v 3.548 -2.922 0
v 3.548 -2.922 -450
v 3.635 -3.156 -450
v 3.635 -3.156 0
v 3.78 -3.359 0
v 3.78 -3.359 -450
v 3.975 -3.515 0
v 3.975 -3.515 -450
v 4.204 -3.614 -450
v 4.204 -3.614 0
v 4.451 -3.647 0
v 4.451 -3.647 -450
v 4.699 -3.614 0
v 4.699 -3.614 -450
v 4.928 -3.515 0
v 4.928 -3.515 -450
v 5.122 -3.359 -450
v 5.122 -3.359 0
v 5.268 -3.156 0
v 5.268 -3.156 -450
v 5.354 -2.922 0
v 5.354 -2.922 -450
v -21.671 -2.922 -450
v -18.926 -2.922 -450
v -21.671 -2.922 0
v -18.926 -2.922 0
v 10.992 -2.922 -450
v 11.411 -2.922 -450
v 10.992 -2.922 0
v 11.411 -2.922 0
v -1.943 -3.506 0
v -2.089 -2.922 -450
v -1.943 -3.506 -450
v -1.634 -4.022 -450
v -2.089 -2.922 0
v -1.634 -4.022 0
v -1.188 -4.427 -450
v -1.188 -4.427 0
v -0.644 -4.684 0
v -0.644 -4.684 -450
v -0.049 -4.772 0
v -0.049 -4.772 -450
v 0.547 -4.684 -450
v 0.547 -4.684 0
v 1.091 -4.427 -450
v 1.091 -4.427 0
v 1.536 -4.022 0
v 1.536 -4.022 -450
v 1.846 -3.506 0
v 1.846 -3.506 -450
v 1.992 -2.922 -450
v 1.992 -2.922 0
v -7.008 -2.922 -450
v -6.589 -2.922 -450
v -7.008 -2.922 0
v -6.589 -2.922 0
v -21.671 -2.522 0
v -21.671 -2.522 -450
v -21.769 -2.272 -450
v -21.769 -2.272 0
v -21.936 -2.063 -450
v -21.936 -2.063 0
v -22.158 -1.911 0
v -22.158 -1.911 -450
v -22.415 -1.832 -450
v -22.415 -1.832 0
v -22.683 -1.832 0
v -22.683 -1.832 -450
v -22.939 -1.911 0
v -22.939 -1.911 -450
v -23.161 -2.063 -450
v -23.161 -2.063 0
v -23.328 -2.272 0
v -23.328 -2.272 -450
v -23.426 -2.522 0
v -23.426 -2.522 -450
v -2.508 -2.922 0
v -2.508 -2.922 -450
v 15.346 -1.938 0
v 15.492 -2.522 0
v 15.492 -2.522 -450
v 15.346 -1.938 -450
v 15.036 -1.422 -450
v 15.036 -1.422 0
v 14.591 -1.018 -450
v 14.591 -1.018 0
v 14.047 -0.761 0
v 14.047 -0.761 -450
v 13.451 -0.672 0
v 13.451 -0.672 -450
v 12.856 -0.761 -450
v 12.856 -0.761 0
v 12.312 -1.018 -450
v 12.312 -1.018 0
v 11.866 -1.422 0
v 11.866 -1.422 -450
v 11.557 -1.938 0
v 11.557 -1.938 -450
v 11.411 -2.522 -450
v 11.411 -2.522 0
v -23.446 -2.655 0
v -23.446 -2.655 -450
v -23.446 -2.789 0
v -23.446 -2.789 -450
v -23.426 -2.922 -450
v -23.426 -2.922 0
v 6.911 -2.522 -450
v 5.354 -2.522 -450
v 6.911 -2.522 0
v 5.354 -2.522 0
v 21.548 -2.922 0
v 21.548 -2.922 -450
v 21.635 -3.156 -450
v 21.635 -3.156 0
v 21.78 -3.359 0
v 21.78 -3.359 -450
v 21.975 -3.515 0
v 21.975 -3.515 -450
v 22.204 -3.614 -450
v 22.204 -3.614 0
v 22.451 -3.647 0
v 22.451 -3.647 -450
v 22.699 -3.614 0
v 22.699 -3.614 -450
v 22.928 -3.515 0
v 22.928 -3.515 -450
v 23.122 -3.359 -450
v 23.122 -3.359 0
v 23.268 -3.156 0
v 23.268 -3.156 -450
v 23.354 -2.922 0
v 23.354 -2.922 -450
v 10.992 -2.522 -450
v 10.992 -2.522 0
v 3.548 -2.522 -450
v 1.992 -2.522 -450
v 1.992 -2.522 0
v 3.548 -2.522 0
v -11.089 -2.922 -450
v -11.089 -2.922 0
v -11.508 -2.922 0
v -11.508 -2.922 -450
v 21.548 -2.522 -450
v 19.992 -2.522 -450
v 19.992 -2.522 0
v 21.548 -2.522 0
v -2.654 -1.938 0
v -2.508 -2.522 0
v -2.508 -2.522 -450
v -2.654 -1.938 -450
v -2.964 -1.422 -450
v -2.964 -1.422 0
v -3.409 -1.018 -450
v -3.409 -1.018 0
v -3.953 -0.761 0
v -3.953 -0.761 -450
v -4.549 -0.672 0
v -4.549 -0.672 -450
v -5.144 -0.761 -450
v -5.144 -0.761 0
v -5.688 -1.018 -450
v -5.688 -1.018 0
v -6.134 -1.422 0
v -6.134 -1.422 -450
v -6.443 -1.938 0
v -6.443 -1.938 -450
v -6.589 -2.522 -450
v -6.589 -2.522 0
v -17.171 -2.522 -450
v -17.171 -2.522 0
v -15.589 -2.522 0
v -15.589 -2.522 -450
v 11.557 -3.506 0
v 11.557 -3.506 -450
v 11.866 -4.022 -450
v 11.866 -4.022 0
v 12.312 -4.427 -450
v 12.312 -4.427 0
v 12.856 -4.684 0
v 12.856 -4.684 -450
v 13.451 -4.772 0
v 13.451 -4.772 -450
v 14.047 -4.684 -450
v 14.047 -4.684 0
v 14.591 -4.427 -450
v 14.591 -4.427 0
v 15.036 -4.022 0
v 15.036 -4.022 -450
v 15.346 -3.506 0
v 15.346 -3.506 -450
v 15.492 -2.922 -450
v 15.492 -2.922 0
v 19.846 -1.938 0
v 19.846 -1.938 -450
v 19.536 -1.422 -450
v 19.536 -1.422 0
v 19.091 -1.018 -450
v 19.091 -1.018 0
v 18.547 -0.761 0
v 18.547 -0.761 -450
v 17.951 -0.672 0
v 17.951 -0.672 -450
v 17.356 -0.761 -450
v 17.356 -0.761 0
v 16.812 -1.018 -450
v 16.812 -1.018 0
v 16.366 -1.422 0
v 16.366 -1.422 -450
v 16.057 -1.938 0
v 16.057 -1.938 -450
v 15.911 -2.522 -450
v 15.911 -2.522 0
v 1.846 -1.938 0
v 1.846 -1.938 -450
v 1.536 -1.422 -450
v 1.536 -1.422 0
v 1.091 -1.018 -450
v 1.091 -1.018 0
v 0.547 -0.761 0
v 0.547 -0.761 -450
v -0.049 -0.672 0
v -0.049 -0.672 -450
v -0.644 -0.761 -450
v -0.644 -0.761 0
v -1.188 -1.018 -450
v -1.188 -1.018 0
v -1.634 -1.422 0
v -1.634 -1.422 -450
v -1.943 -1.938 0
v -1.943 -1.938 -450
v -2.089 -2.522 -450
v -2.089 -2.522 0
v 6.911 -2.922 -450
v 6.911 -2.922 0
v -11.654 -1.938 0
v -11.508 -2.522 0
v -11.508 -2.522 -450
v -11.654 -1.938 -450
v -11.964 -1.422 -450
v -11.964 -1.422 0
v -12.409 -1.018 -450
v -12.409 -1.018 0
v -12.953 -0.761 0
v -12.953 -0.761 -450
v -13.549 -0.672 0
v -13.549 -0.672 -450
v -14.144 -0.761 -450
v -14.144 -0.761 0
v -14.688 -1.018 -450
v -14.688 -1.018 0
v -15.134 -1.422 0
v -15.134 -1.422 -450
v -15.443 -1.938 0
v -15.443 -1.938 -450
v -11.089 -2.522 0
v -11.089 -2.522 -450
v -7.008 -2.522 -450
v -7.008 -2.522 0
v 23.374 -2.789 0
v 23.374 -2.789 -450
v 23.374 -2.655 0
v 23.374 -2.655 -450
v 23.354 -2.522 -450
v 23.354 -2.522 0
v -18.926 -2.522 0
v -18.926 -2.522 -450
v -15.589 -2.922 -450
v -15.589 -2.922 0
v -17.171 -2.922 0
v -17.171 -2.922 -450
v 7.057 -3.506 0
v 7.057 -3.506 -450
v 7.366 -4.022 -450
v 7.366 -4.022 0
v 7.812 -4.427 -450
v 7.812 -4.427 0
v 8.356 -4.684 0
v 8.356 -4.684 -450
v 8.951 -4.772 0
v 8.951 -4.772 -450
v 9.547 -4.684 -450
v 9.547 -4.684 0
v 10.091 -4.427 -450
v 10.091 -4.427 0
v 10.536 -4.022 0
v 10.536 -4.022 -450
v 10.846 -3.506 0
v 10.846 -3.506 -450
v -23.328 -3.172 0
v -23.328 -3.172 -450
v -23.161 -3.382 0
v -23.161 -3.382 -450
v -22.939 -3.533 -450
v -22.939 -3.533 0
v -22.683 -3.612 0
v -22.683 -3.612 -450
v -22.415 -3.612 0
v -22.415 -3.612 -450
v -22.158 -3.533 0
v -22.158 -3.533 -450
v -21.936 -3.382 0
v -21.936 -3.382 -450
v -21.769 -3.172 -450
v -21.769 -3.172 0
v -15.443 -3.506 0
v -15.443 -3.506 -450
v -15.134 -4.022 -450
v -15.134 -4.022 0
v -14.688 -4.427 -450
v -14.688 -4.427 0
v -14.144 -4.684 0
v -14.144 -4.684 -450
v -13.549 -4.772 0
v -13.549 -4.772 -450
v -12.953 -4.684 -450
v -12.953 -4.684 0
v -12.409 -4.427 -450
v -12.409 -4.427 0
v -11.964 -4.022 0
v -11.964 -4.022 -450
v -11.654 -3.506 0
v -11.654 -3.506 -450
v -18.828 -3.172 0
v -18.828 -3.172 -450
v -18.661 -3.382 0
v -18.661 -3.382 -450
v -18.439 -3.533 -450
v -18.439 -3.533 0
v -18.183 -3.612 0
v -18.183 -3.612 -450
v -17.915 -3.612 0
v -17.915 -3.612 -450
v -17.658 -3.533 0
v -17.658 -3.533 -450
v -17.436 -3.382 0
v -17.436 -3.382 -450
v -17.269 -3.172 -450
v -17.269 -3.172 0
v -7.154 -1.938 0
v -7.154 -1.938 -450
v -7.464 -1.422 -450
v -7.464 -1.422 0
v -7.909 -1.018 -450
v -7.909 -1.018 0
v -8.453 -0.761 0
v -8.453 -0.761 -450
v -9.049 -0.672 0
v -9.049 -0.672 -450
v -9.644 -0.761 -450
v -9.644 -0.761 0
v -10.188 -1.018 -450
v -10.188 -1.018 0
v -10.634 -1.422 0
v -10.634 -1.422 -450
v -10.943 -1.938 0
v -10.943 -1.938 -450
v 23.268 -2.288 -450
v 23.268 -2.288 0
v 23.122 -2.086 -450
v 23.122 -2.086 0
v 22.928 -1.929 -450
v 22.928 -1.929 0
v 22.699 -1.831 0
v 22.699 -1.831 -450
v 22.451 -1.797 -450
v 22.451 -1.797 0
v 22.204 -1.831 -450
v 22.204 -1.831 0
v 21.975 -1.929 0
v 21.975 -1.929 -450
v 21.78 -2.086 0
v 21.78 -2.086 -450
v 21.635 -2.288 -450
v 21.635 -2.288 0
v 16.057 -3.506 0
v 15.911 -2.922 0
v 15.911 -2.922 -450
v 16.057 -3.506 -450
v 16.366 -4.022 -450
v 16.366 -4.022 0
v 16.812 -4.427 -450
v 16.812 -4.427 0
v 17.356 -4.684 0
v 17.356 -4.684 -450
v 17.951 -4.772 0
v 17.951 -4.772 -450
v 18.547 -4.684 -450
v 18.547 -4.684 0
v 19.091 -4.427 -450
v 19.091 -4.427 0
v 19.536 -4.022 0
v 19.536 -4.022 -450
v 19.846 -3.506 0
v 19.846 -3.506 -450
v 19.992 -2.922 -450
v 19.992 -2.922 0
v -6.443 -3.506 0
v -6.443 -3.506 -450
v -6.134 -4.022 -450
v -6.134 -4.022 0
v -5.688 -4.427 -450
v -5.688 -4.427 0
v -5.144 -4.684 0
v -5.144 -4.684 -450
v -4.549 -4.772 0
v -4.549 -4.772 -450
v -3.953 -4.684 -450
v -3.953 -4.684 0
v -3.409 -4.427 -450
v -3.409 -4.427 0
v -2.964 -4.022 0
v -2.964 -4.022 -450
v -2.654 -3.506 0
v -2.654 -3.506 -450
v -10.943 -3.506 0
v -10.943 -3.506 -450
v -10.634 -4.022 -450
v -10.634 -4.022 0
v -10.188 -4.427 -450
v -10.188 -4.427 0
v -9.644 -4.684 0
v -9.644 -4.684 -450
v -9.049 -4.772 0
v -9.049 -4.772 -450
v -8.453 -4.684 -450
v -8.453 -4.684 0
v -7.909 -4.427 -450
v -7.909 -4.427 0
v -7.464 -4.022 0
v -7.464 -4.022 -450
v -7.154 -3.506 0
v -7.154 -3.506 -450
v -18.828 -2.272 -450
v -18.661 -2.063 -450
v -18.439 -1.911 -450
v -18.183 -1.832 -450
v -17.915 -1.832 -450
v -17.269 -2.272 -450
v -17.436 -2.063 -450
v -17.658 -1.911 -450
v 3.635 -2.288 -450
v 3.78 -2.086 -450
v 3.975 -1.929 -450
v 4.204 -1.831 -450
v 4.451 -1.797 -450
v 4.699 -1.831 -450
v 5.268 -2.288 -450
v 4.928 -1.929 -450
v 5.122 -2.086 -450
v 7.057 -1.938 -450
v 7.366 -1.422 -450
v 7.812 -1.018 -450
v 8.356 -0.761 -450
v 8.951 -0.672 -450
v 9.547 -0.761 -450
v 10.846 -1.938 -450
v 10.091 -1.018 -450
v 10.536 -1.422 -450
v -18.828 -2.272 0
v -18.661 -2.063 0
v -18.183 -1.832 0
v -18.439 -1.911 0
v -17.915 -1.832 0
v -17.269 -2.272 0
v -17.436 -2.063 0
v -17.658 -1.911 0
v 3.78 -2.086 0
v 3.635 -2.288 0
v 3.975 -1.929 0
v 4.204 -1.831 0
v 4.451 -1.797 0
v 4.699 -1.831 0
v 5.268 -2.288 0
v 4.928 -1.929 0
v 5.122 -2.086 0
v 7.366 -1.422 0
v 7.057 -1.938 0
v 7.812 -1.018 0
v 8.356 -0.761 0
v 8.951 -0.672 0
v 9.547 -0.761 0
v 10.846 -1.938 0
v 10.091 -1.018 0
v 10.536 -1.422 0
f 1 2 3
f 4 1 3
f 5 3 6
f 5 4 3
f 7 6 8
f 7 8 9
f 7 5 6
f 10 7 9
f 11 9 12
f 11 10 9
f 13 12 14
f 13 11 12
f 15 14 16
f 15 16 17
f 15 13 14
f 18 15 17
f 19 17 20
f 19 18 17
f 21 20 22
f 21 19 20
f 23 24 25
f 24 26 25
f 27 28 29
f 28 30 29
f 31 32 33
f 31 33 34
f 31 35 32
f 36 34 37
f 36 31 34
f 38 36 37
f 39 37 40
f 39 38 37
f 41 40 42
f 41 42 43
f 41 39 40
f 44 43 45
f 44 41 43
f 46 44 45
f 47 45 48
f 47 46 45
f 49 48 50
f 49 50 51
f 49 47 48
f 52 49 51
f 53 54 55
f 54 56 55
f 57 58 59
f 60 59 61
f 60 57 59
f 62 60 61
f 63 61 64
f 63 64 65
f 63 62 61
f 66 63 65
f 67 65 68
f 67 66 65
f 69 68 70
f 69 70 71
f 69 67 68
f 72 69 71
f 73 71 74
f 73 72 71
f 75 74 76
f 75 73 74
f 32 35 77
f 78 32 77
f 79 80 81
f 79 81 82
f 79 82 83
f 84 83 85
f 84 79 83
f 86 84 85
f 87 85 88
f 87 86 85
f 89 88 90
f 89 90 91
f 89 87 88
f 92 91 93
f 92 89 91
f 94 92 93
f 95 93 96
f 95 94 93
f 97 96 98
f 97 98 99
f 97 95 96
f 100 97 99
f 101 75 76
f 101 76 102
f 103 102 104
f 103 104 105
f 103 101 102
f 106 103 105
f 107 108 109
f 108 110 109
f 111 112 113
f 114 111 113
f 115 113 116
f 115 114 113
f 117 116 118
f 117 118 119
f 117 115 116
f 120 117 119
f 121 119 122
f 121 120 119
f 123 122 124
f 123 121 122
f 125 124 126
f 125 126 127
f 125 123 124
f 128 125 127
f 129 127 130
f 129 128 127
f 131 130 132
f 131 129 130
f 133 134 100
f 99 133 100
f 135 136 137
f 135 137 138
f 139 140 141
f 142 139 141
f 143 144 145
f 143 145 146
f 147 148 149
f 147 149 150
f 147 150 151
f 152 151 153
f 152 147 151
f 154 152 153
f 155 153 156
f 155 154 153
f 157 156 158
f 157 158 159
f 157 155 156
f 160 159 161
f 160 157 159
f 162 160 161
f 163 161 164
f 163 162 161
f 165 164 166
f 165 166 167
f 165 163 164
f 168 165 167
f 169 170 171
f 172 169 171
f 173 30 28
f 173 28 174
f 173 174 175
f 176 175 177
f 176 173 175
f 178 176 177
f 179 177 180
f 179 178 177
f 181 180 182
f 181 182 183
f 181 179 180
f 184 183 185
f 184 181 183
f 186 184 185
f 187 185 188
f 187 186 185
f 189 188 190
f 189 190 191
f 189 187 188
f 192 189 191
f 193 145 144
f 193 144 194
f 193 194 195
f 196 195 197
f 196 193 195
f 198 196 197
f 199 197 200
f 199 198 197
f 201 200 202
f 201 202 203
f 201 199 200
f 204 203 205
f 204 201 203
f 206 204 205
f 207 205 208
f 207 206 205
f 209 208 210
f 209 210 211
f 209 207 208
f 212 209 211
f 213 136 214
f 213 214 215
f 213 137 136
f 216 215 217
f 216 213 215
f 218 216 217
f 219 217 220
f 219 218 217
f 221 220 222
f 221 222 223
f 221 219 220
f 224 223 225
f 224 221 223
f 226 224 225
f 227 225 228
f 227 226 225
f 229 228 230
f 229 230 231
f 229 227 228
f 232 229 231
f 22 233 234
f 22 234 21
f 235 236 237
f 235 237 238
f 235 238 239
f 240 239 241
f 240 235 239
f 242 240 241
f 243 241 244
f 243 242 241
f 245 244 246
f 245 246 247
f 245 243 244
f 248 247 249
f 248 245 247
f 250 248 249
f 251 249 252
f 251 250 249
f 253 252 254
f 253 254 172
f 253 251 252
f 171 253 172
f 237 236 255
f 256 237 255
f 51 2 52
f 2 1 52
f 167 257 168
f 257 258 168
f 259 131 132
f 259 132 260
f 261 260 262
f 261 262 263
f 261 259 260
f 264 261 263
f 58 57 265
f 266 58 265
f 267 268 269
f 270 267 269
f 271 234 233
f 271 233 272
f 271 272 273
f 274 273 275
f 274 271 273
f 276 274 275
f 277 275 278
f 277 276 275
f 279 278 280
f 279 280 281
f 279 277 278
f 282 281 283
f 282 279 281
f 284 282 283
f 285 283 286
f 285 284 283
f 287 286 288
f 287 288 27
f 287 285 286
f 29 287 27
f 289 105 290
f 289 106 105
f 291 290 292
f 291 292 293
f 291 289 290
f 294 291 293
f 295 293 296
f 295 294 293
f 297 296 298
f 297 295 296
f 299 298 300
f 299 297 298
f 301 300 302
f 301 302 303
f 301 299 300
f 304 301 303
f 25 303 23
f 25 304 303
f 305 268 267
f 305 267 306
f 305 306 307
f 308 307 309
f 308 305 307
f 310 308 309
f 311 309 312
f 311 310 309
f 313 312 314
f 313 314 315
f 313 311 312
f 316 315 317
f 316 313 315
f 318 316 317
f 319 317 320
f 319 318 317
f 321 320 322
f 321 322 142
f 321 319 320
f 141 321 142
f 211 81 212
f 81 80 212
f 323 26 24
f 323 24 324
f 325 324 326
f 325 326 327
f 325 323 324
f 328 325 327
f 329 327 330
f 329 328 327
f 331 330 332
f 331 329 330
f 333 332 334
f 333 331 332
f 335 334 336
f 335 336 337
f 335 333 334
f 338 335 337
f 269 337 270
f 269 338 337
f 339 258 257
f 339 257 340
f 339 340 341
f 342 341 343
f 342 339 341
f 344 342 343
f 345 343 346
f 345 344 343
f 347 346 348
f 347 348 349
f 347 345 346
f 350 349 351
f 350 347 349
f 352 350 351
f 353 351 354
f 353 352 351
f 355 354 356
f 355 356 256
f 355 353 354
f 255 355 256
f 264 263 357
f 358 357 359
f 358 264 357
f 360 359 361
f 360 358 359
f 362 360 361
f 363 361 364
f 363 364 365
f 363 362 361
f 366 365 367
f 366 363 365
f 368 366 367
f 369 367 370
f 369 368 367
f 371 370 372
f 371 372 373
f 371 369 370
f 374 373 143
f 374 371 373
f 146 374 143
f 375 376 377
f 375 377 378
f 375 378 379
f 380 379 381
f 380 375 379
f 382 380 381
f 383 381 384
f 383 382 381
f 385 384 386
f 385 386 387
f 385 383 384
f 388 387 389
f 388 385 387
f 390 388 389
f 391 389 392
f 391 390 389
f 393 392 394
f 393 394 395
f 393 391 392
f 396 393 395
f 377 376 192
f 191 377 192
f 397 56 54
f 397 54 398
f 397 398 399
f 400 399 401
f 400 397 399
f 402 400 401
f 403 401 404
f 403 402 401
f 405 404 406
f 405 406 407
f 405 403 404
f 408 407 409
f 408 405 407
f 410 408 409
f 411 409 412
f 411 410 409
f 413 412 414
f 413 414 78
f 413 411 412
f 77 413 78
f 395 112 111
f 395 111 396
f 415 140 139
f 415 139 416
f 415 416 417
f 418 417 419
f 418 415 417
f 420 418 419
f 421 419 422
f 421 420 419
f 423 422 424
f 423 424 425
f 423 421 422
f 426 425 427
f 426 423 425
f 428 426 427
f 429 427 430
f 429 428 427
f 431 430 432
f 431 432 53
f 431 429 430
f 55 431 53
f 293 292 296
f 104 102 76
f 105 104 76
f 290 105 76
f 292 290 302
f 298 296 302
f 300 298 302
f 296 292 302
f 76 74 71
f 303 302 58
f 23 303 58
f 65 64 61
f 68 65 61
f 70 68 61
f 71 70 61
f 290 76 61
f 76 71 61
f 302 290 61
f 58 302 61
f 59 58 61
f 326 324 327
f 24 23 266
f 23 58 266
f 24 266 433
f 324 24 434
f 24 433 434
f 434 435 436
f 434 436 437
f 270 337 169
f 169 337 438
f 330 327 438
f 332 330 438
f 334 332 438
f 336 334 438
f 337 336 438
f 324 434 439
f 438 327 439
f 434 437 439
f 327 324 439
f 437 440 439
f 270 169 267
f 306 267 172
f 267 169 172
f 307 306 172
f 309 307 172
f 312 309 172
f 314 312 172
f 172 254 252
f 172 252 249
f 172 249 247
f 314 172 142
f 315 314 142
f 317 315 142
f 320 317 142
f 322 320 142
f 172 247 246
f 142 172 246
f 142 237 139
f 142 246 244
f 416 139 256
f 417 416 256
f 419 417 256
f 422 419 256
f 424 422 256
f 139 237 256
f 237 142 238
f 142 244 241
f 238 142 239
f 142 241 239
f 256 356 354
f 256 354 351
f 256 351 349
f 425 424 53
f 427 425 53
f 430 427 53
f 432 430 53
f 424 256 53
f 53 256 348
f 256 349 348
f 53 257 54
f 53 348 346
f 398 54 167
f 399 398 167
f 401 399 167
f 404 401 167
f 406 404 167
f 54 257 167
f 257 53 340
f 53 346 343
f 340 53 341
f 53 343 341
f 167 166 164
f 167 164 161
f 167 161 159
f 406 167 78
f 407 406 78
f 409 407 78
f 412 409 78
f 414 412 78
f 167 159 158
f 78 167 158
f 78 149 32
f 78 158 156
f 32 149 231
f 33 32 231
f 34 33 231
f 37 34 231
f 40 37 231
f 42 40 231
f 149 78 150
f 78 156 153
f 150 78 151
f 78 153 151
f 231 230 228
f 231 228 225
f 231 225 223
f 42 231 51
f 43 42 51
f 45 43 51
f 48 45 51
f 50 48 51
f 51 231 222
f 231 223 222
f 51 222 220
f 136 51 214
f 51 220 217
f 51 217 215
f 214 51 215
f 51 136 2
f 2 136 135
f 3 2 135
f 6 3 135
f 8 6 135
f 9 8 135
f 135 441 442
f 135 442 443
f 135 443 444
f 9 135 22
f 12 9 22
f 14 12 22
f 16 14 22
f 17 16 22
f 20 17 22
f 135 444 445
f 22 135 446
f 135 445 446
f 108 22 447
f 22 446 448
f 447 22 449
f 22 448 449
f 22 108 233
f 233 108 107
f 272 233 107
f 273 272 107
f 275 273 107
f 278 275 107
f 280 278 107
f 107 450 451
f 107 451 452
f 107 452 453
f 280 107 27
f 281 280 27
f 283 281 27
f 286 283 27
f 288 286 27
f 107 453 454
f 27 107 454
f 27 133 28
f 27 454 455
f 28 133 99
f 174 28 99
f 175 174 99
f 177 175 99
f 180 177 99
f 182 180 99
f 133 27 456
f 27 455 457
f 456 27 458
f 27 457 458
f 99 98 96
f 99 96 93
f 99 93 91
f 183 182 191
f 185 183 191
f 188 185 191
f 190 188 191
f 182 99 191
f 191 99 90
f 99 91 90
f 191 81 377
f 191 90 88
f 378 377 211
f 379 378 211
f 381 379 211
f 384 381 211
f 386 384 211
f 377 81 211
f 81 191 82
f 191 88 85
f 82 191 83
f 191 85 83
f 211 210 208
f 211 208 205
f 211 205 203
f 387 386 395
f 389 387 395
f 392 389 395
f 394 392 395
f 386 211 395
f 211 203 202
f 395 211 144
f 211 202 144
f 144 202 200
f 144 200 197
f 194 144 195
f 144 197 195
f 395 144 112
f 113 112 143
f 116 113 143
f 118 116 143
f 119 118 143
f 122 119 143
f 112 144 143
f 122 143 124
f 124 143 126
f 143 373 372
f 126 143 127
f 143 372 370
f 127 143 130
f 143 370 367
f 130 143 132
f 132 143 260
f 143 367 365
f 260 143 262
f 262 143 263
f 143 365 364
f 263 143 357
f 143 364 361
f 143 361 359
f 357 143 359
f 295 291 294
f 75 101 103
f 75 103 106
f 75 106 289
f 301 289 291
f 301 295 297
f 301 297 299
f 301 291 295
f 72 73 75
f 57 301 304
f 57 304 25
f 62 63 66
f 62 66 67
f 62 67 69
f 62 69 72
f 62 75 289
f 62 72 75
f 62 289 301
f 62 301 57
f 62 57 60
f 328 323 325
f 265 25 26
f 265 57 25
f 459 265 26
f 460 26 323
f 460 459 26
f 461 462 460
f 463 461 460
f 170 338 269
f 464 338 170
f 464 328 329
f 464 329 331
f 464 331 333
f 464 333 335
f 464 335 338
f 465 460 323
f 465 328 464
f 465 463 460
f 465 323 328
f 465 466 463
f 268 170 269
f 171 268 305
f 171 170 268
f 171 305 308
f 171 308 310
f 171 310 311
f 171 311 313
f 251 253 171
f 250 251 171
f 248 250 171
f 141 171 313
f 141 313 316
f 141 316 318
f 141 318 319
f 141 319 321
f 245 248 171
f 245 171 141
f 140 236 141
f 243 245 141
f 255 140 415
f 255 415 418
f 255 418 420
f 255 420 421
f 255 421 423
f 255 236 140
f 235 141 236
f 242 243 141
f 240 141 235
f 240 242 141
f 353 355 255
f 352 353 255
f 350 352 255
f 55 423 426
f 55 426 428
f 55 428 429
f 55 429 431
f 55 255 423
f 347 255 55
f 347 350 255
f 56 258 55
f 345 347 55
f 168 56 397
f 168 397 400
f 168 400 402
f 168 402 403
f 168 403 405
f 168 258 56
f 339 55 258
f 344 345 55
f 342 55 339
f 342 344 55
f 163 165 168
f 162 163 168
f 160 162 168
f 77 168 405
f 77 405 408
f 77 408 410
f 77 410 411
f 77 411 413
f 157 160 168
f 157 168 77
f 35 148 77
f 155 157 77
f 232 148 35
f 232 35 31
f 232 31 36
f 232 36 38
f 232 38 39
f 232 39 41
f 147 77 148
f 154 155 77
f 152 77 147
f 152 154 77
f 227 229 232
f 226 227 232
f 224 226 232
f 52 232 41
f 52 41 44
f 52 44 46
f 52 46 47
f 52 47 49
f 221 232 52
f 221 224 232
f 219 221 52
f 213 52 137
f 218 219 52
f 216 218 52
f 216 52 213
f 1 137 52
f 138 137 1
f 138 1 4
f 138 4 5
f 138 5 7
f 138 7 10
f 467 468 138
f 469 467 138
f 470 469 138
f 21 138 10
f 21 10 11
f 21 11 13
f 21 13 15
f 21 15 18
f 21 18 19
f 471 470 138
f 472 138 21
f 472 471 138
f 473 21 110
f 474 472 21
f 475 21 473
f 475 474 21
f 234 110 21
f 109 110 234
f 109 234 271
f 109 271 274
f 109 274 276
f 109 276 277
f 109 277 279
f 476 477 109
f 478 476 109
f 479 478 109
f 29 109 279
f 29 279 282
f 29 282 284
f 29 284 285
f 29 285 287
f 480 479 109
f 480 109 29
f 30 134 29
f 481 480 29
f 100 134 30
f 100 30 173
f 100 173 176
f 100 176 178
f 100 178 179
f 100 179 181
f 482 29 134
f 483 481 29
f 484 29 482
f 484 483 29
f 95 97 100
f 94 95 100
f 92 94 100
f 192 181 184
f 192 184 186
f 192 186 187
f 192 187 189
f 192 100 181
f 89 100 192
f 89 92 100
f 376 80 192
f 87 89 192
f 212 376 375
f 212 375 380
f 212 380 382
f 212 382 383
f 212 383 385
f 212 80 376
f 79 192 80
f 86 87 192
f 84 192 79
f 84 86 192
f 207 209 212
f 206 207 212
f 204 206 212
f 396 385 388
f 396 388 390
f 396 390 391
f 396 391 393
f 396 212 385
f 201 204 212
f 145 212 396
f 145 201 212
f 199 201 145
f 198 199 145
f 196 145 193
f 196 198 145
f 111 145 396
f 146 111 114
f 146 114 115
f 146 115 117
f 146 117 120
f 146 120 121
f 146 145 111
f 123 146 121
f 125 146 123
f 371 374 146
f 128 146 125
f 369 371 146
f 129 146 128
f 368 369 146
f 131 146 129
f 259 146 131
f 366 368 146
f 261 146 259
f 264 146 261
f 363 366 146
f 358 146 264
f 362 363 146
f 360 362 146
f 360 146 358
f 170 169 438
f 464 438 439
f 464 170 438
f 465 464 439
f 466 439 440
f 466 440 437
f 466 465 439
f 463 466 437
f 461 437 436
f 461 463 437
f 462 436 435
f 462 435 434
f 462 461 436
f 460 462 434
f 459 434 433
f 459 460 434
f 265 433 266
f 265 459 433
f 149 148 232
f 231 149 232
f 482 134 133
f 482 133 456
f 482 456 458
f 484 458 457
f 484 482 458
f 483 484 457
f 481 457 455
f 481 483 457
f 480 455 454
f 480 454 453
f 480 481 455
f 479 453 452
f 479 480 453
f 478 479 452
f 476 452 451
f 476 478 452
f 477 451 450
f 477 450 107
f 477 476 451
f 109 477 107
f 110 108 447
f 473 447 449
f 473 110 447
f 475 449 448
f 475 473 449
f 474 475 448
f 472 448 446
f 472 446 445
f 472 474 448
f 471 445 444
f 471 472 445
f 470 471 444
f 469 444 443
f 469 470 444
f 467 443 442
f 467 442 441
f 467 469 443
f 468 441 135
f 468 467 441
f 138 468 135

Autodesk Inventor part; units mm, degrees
ref_plane "YZ Plane" through (0, 0, 0) normal (1, 0, 0) x (0, 1, 0)
ref_plane "XZ Plane" through (0, 0, 0) normal (0, 1, 0) x (-1, 0, 0)
sketch "Sketch1" plane through (0, 0, 0) normal (0, 0, 1) x (1, 0, 0)
  line L0 (21.5482, -2.9223) -> (19.9915, -2.9223) projected
  arc A0 (15.9111, -2.9223) -> (19.9915, -2.9223) centre (17.9513, -2.7223) ccw projected
  line L1 (15.9111, -2.9223) -> (15.4915, -2.9223) projected
  arc A1 (11.4111, -2.9223) -> (15.4915, -2.9223) centre (13.4513, -2.7223) ccw projected
  line L2 (11.4111, -2.9223) -> (10.9915, -2.9223) projected
  arc A2 (6.9111, -2.9223) -> (10.9915, -2.9223) centre (8.9513, -2.7223) ccw projected
  line L3 (6.9111, -2.9223) -> (5.3544, -2.9223) projected
  arc A3 (3.5482, -2.9223) -> (5.3544, -2.9223) centre (4.4513, -2.7223) ccw projected
  line L4 (3.5482, -2.9223) -> (1.9915, -2.9223) projected
  arc A4 (-2.0889, -2.9223) -> (1.9915, -2.9223) centre (-0.0487, -2.7223) ccw projected
  line L5 (-2.0889, -2.9223) -> (-2.5085, -2.9223) projected
  arc A5 (-6.5889, -2.9223) -> (-2.5085, -2.9223) centre (-4.5487, -2.7223) ccw projected
  line L6 (-6.5889, -2.9223) -> (-7.0085, -2.9223) projected
  arc A6 (-11.0889, -2.9223) -> (-7.0085, -2.9223) centre (-9.0487, -2.7223) ccw projected
  line L7 (-11.0889, -2.9223) -> (-11.5085, -2.9223) projected
  arc A7 (-15.5889, -2.9223) -> (-11.5085, -2.9223) centre (-13.5487, -2.7223) ccw projected
  line L8 (-15.5889, -2.9223) -> (-17.1712, -2.9223) projected
  arc A8 (-18.9262, -2.9223) -> (-17.1712, -2.9223) centre (-18.0487, -2.7223) ccw projected
  line L9 (-18.9262, -2.9223) -> (-21.6712, -2.9223) projected
  arc A9 (-23.4262, -2.9223) -> (-21.6712, -2.9223) centre (-22.5487, -2.7223) ccw projected
  line L10 (-23.4262, -2.9223) -> (-29.4262, -2.9223) projected
  line L11 (-29.4262, -2.9223) -> (-29.4262, -2.7223) projected
  line L12 (-29.4262, -2.7223) -> (-35.4262, -2.7223) projected
  line L13 (-35.4262, -2.7223) -> (-35.4262, -7.7223) projected
  line L14 (-35.4262, -7.7223) -> (35.3544, -7.7223) projected
  line L15 (35.3544, -7.7223) -> (35.3544, -2.7223) projected
  line L16 (35.3544, -2.7223) -> (29.3544, -2.7223) projected
  line L17 (29.3544, -2.7223) -> (29.3544, -2.9223) projected
  line L18 (29.3544, -2.9223) -> (23.3544, -2.9223) projected
  arc A10 (21.5482, -2.9223) -> (23.3544, -2.9223) centre (22.4513, -2.7223) ccw projected
  line L19 (19.9915, -2.5223) -> (21.5482, -2.5223) projected
  arc A11 (23.3544, -2.5223) -> (21.5482, -2.5223) centre (22.4513, -2.7223) ccw projected
  line L20 (23.3544, -2.5223) -> (29.3544, -2.5223) projected
  line L21 (29.3544, -2.5223) -> (29.3544, -2.7223) projected
  line L22 (29.3544, -2.7223) -> (35.3544, -2.7223) projected
  line L23 (35.3544, -2.7223) -> (35.3544, 2.2777) projected
  line L24 (35.3544, 2.2777) -> (-35.4262, 2.2777) projected
  line L25 (-35.4262, 2.2777) -> (-35.4262, -2.7223) projected
  line L26 (-35.4262, -2.7223) -> (-29.4262, -2.7223) projected
  line L27 (-29.4262, -2.7223) -> (-29.4262, -2.5223) projected
  line L28 (-29.4262, -2.5223) -> (-23.4262, -2.5223) projected
  arc A12 (-21.6712, -2.5223) -> (-23.4262, -2.5223) centre (-22.5487, -2.7223) ccw projected
  line L29 (-21.6712, -2.5223) -> (-18.9262, -2.5223) projected
  arc A13 (-17.1712, -2.5223) -> (-18.9262, -2.5223) centre (-18.0487, -2.7223) ccw projected
  line L30 (-17.1712, -2.5223) -> (-15.5889, -2.5223) projected
  arc A14 (-11.5085, -2.5223) -> (-15.5889, -2.5223) centre (-13.5487, -2.7223) ccw projected
  line L31 (-11.5085, -2.5223) -> (-11.0889, -2.5223) projected
  arc A15 (-7.0085, -2.5223) -> (-11.0889, -2.5223) centre (-9.0487, -2.7223) ccw projected
  line L32 (-7.0085, -2.5223) -> (-6.5889, -2.5223) projected
  arc A16 (-2.5085, -2.5223) -> (-6.5889, -2.5223) centre (-4.5487, -2.7223) ccw projected
  line L33 (-2.5085, -2.5223) -> (-2.0889, -2.5223) projected
  arc A17 (1.9915, -2.5223) -> (-2.0889, -2.5223) centre (-0.0487, -2.7223) ccw projected
  line L34 (1.9915, -2.5223) -> (3.5482, -2.5223) projected
  arc A18 (5.3544, -2.5223) -> (3.5482, -2.5223) centre (4.4513, -2.7223) ccw projected
  line L35 (5.3544, -2.5223) -> (6.9111, -2.5223) projected
  arc A19 (10.9915, -2.5223) -> (6.9111, -2.5223) centre (8.9513, -2.7223) ccw projected
  line L36 (10.9915, -2.5223) -> (11.4111, -2.5223) projected
  arc A20 (15.4915, -2.5223) -> (11.4111, -2.5223) centre (13.4513, -2.7223) ccw projected
  line L37 (15.4915, -2.5223) -> (15.9111, -2.5223) projected
  arc A21 (19.9915, -2.5223) -> (15.9111, -2.5223) centre (17.9513, -2.7223) ccw projected
  arc A22 (21.5482, -2.9223) -> (21.5482, -2.5223) centre (22.4513, -2.7223) ccw
  arc A23 (-21.6712, -2.5223) -> (-21.6712, -2.9223) centre (-22.5487, -2.7223) ccw
  point P0 (0, 0)
ref_plane "Work Plane1" through (-35.4262, -2.7223, -450) normal (0, 0, -1) x (0, 1, 0)
extrude "Extrusion1" add sketch "Sketch1" against normal up to surface (450 mm away) contours L0 A0 L1 A1 L2 A2 L3 A3 L4 A4 L5 A5 L6 A6 L7 A7 L8 A8 L9 A9 A23 A12 L29 A13 L30 A14 L31 A15 L32 A16 L33 A17 L34 A18 L35 A19 L36 A20 L37 A21 L19 A11 A22 A10
properties part number "3d_LM - Top Wire - Phantom"
